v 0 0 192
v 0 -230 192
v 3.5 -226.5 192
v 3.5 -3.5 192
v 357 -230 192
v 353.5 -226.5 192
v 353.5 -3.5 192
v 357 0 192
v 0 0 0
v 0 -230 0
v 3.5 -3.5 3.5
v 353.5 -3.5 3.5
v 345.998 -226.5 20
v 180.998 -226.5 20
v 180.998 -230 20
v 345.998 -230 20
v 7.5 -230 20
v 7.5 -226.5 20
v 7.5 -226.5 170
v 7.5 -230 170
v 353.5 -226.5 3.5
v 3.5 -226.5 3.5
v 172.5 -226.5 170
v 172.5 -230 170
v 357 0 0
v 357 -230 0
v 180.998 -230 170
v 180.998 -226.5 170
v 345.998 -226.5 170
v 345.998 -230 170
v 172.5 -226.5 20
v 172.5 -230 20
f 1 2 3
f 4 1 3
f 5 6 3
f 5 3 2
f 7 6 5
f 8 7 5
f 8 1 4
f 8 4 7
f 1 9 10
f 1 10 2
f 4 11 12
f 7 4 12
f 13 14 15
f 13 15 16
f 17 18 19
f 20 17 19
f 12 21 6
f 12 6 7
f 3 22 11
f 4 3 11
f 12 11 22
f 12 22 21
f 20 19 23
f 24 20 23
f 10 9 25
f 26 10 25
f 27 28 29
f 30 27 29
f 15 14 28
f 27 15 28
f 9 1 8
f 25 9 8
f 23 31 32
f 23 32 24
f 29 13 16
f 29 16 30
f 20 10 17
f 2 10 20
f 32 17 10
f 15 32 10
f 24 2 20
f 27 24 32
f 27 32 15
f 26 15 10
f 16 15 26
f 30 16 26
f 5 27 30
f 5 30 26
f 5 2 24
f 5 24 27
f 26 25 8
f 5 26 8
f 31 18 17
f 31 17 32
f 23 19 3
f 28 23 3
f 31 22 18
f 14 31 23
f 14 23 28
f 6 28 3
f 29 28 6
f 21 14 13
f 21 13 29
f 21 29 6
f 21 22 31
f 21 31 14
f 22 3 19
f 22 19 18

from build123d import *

# Parameters (mm, degrees)
SKETCH_W        = 357
SKETCH_H        = 197
PAD_DEPTH       = 230
SKETCH001_W     = 357
SKETCH001_H     = 230
POCKET_DEPTH    = 5
SKETCH002_W     = 350
SKETCH002_H     = 223
POCKET001_DEPTH = 192
SKETCH003_W     = 165
SKETCH003_H     = 150
POCKET002_DEPTH = 10


with BuildPart() as part:
    # Sketch → Pad (new body)
    with BuildSketch(Plane.XZ):
        with Locations((178.5, 98.5)):
            Rectangle(SKETCH_W, SKETCH_H)
    extrude(amount=PAD_DEPTH)

    # Sketch001 → Pocket (cut)
    with BuildSketch(Plane.XY.offset(192)):
        with Locations((178.5, -115)):
            Rectangle(SKETCH001_W, SKETCH001_H)
    extrude(amount=POCKET_DEPTH, mode=Mode.SUBTRACT)

    # Sketch002 → Pocket001 (cut)
    with BuildSketch(Plane(origin=(3.5, -3.5, 3.5), x_dir=(1, 0, 0), z_dir=(0, 0, 1))):
        with Locations((175, -111.5)):
            Rectangle(SKETCH002_W, SKETCH002_H)
    extrude(amount=POCKET001_DEPTH, mode=Mode.SUBTRACT)

    # Sketch003 → Pocket002 (cut)
    with BuildSketch(Plane(origin=(7.5, -220, 20), x_dir=(1, 0, 0), z_dir=(0, -1, 0))):
        with Locations((82.5, 75)):
            Rectangle(SKETCH003_W, SKETCH003_H)
        with Locations((255.997886, 75)):
            Rectangle(SKETCH003_W, SKETCH003_H)
    extrude(amount=POCKET002_DEPTH, mode=Mode.SUBTRACT)


solid = part.part
